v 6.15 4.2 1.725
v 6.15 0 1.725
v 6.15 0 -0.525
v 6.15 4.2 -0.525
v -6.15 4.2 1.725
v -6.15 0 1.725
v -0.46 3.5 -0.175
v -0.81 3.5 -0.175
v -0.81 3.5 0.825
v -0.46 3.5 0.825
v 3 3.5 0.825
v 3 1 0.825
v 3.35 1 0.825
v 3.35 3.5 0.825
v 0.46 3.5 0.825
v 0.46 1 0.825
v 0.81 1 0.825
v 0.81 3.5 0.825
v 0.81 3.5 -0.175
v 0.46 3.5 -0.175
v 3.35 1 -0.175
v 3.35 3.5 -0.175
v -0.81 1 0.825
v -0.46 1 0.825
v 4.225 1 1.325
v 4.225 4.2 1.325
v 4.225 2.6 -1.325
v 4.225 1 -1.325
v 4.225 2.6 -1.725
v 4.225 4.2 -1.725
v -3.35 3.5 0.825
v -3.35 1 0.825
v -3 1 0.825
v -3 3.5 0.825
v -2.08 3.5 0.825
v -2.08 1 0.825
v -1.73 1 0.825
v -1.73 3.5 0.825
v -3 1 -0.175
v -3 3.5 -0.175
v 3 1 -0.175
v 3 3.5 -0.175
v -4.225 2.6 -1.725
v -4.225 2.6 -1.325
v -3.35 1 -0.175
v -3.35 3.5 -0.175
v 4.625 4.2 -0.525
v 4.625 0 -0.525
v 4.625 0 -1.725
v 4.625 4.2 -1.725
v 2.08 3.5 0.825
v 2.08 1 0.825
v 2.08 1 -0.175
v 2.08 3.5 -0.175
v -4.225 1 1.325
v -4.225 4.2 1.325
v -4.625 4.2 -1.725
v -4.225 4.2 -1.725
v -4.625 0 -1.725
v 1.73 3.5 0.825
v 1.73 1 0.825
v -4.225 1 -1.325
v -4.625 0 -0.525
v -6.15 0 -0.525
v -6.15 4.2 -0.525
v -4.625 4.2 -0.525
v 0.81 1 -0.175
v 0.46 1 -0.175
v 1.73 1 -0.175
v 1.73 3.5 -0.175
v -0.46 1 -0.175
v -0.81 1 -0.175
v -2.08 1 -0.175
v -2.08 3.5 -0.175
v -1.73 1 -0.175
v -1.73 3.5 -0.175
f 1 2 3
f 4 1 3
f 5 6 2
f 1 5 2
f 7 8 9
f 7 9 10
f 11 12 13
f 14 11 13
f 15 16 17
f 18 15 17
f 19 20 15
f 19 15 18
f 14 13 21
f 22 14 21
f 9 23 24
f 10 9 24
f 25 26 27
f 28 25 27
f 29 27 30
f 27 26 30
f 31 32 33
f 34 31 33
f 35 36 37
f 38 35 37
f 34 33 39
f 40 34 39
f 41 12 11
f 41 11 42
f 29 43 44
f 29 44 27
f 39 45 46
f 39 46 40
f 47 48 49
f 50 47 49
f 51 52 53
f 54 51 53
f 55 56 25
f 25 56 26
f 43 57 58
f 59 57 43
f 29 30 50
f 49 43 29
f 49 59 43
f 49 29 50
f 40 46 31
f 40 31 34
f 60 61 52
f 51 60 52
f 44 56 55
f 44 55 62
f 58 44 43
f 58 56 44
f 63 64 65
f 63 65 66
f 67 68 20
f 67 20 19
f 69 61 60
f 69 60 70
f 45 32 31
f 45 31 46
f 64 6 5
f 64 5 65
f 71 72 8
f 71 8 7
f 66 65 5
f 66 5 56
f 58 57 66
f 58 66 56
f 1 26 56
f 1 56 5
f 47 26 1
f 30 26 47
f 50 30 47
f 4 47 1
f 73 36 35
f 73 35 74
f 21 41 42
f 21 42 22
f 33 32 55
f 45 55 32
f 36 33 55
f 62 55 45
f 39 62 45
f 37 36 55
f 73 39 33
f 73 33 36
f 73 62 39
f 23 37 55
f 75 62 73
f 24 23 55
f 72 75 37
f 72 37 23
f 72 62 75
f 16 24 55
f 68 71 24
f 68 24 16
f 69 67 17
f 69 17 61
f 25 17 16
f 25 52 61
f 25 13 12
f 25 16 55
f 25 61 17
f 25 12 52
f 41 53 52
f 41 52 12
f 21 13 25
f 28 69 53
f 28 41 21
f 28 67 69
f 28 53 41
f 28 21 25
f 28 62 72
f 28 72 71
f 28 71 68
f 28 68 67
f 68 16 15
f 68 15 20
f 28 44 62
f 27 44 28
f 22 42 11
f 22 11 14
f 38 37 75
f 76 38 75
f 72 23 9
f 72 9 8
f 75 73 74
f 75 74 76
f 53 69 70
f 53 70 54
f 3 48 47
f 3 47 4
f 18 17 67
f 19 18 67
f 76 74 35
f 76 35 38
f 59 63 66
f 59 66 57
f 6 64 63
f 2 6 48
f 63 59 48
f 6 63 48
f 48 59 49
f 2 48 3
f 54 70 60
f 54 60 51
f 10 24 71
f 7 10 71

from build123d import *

# Parameters (mm, degrees)
SKETCH1_W           = 1.525
SKETCH1_H           = 2.25
SKETCH1_W_2         = 9.25
SKETCH1_H_2         = 1.2
BOSS_EXTRUDE1_DEPTH = 4.2
SKETCH2_W           = 8.45
SKETCH2_H           = 2.65
CUT_EXTRUDE1_DEPTH  = 3.2
SKETCH3_W           = 8.45
SKETCH3_H           = 0.4
CUT_EXTRUDE2_DEPTH  = 1.6
SKETCH4_W           = 0.35
SKETCH4_H           = 1
BOSS_EXTRUDE2_DEPTH = 2.5


with BuildPart() as part:
    # Sketch1 → Boss-Extrude1 (new body)
    with BuildSketch(Plane(origin=(0, 0, 0), x_dir=(1, 0, 0), z_dir=(0, 1, 0))):
        with Locations((-5.3875, -0.6)):
            Rectangle(SKETCH1_W, SKETCH1_H)
        with Locations((0, 1.125)):
            Rectangle(SKETCH1_W_2, SKETCH1_H_2)
        with Locations((0, -0.6)):
            Rectangle(SKETCH1_W_2, SKETCH1_H)
        with Locations((5.3875, -0.6)):
            Rectangle(SKETCH1_W, SKETCH1_H)
    extrude(amount=BOSS_EXTRUDE1_DEPTH)

    # Sketch2 → Cut-Extrude1 (cut)
    with BuildSketch(Plane(origin=(0, 4.2, 0), x_dir=(1, 0, 0), z_dir=(0, 1, 0))):
        Rectangle(SKETCH2_W, SKETCH2_H)
    extrude(amount=-CUT_EXTRUDE1_DEPTH, mode=Mode.SUBTRACT)

    # Sketch3 → Cut-Extrude2 (cut)
    with BuildSketch(Plane(origin=(0, 4.2, 0), x_dir=(1, 0, 0), z_dir=(0, 1, 0))):
        with Locations((0, 1.525)):
            Rectangle(SKETCH3_W, SKETCH3_H)
    extrude(amount=-CUT_EXTRUDE2_DEPTH, mode=Mode.SUBTRACT)

    # Sketch4 → Boss-Extrude2 (add)
    with BuildSketch(Plane(origin=(0, 1, 0), x_dir=(1, 0, 0), z_dir=(0, 1, 0))):
        with Locations((0.635, -0.325)):
            Rectangle(SKETCH4_W, SKETCH4_H)
        with Locations((-0.635, -0.325)):
            Rectangle(SKETCH4_W, SKETCH4_H)
        with Locations((1.905, -0.325)):
            Rectangle(SKETCH4_W, SKETCH4_H)
        with Locations((3.175, -0.325)):
            Rectangle(SKETCH4_W, SKETCH4_H)
        with Locations((-3.175, -0.325)):
            Rectangle(SKETCH4_W, SKETCH4_H)
        with Locations((-1.905, -0.325)):
            Rectangle(SKETCH4_W, SKETCH4_H)
    extrude(amount=BOSS_EXTRUDE2_DEPTH)


solid = part.part
